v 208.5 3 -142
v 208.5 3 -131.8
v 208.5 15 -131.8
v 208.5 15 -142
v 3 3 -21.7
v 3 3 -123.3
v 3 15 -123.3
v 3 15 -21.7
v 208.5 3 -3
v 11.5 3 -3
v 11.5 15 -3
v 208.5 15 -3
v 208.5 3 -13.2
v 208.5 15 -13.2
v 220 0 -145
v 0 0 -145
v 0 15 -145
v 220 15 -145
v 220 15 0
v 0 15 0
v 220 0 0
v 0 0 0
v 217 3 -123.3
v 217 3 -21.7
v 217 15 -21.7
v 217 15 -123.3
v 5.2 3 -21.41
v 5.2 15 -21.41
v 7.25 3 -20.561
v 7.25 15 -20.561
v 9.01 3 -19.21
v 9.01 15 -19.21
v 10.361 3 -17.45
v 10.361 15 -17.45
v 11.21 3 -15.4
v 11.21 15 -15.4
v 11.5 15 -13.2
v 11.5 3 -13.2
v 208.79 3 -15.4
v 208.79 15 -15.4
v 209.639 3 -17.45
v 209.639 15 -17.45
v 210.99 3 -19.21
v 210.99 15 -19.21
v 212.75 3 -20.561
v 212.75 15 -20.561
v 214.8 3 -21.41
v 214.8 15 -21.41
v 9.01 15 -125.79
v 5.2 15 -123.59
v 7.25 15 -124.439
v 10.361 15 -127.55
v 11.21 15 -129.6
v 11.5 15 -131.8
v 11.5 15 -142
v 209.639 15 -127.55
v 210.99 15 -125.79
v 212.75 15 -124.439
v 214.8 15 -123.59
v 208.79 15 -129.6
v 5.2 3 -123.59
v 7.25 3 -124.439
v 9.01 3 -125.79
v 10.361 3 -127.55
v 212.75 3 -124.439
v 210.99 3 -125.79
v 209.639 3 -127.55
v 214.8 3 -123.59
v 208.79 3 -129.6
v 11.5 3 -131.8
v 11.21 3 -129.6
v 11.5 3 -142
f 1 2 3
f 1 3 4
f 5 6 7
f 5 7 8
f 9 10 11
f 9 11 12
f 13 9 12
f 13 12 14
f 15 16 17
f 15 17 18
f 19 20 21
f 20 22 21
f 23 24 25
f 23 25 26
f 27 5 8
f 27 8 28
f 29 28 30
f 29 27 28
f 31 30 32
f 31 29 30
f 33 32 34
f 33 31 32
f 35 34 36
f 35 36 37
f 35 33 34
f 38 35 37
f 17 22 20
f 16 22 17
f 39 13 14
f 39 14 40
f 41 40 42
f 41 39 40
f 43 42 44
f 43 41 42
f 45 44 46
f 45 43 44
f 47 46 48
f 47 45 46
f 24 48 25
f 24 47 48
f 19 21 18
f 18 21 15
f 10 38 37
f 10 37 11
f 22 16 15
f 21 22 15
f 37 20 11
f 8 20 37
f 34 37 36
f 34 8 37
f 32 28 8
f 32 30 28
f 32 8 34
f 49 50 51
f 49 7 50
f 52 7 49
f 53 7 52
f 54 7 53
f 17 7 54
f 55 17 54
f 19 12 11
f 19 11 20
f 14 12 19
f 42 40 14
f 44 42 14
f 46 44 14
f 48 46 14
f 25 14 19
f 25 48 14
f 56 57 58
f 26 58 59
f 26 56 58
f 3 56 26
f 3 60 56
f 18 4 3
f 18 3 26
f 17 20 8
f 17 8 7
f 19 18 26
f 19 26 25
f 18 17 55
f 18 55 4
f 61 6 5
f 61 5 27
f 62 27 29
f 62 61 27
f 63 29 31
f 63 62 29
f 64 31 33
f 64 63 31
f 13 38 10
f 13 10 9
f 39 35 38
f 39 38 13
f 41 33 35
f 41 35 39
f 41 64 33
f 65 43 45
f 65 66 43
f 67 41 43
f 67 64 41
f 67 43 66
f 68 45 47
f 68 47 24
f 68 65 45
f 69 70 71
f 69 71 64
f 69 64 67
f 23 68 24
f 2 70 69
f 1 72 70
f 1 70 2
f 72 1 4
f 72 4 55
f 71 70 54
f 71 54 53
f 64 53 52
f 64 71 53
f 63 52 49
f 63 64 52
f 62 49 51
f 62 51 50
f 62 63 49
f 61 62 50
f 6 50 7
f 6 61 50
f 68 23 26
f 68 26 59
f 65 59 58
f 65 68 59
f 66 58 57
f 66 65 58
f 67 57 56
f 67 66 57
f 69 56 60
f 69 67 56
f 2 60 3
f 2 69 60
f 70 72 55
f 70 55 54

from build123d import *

# Parameters (mm, degrees)
SKETCH1_W           = 220
SKETCH1_H           = 145
BOSS_EXTRUDE1_DEPTH = 3
SKETCH2_W           = 220
SKETCH2_H           = 145
BOSS_EXTRUDE2_DEPTH = 12


with BuildPart() as part:
    # Sketch1 → Boss-Extrude1 (new body)
    with BuildSketch(Plane(origin=(0, 0, 0), x_dir=(1, 0, 0), z_dir=(0, 1, 0))):
        with Locations((110, 72.5)):
            Rectangle(SKETCH1_W, SKETCH1_H)
    extrude(amount=BOSS_EXTRUDE1_DEPTH)

    # Sketch2 → Boss-Extrude2 (add)
    with BuildSketch(Plane(origin=(0, 3, 0), x_dir=(1, 0, 0), z_dir=(0, 1, 0))):
        with Locations((110, 72.5)):
            Rectangle(SKETCH2_W, SKETCH2_H)
        with BuildLine():
            Line((3, 123.3), (3, 21.7))
            ThreePointArc((3, 21.7), (9.01040764, 19.21040764), (11.5, 13.2))
            Line((11.5, 13.2), (11.5, 3))
            Line((11.5, 3), (208.5, 3))
            Line((208.5, 3), (208.5, 13.2))
            ThreePointArc((208.5, 13.2), (210.98959236, 19.21040764), (217, 21.7))
            Line((217, 21.7), (217, 123.3))
            ThreePointArc((217, 123.3), (210.98959236, 125.78959236), (208.5, 131.8))
            Line((208.5, 131.8), (208.5, 142))
            Line((208.5, 142), (11.5, 142))
            Line((11.5, 142), (11.5, 131.8))
            ThreePointArc((11.5, 131.8), (9.01040764, 125.78959236), (3, 123.3))
        make_face(mode=Mode.SUBTRACT)
    extrude(amount=BOSS_EXTRUDE2_DEPTH)


solid = part.part
